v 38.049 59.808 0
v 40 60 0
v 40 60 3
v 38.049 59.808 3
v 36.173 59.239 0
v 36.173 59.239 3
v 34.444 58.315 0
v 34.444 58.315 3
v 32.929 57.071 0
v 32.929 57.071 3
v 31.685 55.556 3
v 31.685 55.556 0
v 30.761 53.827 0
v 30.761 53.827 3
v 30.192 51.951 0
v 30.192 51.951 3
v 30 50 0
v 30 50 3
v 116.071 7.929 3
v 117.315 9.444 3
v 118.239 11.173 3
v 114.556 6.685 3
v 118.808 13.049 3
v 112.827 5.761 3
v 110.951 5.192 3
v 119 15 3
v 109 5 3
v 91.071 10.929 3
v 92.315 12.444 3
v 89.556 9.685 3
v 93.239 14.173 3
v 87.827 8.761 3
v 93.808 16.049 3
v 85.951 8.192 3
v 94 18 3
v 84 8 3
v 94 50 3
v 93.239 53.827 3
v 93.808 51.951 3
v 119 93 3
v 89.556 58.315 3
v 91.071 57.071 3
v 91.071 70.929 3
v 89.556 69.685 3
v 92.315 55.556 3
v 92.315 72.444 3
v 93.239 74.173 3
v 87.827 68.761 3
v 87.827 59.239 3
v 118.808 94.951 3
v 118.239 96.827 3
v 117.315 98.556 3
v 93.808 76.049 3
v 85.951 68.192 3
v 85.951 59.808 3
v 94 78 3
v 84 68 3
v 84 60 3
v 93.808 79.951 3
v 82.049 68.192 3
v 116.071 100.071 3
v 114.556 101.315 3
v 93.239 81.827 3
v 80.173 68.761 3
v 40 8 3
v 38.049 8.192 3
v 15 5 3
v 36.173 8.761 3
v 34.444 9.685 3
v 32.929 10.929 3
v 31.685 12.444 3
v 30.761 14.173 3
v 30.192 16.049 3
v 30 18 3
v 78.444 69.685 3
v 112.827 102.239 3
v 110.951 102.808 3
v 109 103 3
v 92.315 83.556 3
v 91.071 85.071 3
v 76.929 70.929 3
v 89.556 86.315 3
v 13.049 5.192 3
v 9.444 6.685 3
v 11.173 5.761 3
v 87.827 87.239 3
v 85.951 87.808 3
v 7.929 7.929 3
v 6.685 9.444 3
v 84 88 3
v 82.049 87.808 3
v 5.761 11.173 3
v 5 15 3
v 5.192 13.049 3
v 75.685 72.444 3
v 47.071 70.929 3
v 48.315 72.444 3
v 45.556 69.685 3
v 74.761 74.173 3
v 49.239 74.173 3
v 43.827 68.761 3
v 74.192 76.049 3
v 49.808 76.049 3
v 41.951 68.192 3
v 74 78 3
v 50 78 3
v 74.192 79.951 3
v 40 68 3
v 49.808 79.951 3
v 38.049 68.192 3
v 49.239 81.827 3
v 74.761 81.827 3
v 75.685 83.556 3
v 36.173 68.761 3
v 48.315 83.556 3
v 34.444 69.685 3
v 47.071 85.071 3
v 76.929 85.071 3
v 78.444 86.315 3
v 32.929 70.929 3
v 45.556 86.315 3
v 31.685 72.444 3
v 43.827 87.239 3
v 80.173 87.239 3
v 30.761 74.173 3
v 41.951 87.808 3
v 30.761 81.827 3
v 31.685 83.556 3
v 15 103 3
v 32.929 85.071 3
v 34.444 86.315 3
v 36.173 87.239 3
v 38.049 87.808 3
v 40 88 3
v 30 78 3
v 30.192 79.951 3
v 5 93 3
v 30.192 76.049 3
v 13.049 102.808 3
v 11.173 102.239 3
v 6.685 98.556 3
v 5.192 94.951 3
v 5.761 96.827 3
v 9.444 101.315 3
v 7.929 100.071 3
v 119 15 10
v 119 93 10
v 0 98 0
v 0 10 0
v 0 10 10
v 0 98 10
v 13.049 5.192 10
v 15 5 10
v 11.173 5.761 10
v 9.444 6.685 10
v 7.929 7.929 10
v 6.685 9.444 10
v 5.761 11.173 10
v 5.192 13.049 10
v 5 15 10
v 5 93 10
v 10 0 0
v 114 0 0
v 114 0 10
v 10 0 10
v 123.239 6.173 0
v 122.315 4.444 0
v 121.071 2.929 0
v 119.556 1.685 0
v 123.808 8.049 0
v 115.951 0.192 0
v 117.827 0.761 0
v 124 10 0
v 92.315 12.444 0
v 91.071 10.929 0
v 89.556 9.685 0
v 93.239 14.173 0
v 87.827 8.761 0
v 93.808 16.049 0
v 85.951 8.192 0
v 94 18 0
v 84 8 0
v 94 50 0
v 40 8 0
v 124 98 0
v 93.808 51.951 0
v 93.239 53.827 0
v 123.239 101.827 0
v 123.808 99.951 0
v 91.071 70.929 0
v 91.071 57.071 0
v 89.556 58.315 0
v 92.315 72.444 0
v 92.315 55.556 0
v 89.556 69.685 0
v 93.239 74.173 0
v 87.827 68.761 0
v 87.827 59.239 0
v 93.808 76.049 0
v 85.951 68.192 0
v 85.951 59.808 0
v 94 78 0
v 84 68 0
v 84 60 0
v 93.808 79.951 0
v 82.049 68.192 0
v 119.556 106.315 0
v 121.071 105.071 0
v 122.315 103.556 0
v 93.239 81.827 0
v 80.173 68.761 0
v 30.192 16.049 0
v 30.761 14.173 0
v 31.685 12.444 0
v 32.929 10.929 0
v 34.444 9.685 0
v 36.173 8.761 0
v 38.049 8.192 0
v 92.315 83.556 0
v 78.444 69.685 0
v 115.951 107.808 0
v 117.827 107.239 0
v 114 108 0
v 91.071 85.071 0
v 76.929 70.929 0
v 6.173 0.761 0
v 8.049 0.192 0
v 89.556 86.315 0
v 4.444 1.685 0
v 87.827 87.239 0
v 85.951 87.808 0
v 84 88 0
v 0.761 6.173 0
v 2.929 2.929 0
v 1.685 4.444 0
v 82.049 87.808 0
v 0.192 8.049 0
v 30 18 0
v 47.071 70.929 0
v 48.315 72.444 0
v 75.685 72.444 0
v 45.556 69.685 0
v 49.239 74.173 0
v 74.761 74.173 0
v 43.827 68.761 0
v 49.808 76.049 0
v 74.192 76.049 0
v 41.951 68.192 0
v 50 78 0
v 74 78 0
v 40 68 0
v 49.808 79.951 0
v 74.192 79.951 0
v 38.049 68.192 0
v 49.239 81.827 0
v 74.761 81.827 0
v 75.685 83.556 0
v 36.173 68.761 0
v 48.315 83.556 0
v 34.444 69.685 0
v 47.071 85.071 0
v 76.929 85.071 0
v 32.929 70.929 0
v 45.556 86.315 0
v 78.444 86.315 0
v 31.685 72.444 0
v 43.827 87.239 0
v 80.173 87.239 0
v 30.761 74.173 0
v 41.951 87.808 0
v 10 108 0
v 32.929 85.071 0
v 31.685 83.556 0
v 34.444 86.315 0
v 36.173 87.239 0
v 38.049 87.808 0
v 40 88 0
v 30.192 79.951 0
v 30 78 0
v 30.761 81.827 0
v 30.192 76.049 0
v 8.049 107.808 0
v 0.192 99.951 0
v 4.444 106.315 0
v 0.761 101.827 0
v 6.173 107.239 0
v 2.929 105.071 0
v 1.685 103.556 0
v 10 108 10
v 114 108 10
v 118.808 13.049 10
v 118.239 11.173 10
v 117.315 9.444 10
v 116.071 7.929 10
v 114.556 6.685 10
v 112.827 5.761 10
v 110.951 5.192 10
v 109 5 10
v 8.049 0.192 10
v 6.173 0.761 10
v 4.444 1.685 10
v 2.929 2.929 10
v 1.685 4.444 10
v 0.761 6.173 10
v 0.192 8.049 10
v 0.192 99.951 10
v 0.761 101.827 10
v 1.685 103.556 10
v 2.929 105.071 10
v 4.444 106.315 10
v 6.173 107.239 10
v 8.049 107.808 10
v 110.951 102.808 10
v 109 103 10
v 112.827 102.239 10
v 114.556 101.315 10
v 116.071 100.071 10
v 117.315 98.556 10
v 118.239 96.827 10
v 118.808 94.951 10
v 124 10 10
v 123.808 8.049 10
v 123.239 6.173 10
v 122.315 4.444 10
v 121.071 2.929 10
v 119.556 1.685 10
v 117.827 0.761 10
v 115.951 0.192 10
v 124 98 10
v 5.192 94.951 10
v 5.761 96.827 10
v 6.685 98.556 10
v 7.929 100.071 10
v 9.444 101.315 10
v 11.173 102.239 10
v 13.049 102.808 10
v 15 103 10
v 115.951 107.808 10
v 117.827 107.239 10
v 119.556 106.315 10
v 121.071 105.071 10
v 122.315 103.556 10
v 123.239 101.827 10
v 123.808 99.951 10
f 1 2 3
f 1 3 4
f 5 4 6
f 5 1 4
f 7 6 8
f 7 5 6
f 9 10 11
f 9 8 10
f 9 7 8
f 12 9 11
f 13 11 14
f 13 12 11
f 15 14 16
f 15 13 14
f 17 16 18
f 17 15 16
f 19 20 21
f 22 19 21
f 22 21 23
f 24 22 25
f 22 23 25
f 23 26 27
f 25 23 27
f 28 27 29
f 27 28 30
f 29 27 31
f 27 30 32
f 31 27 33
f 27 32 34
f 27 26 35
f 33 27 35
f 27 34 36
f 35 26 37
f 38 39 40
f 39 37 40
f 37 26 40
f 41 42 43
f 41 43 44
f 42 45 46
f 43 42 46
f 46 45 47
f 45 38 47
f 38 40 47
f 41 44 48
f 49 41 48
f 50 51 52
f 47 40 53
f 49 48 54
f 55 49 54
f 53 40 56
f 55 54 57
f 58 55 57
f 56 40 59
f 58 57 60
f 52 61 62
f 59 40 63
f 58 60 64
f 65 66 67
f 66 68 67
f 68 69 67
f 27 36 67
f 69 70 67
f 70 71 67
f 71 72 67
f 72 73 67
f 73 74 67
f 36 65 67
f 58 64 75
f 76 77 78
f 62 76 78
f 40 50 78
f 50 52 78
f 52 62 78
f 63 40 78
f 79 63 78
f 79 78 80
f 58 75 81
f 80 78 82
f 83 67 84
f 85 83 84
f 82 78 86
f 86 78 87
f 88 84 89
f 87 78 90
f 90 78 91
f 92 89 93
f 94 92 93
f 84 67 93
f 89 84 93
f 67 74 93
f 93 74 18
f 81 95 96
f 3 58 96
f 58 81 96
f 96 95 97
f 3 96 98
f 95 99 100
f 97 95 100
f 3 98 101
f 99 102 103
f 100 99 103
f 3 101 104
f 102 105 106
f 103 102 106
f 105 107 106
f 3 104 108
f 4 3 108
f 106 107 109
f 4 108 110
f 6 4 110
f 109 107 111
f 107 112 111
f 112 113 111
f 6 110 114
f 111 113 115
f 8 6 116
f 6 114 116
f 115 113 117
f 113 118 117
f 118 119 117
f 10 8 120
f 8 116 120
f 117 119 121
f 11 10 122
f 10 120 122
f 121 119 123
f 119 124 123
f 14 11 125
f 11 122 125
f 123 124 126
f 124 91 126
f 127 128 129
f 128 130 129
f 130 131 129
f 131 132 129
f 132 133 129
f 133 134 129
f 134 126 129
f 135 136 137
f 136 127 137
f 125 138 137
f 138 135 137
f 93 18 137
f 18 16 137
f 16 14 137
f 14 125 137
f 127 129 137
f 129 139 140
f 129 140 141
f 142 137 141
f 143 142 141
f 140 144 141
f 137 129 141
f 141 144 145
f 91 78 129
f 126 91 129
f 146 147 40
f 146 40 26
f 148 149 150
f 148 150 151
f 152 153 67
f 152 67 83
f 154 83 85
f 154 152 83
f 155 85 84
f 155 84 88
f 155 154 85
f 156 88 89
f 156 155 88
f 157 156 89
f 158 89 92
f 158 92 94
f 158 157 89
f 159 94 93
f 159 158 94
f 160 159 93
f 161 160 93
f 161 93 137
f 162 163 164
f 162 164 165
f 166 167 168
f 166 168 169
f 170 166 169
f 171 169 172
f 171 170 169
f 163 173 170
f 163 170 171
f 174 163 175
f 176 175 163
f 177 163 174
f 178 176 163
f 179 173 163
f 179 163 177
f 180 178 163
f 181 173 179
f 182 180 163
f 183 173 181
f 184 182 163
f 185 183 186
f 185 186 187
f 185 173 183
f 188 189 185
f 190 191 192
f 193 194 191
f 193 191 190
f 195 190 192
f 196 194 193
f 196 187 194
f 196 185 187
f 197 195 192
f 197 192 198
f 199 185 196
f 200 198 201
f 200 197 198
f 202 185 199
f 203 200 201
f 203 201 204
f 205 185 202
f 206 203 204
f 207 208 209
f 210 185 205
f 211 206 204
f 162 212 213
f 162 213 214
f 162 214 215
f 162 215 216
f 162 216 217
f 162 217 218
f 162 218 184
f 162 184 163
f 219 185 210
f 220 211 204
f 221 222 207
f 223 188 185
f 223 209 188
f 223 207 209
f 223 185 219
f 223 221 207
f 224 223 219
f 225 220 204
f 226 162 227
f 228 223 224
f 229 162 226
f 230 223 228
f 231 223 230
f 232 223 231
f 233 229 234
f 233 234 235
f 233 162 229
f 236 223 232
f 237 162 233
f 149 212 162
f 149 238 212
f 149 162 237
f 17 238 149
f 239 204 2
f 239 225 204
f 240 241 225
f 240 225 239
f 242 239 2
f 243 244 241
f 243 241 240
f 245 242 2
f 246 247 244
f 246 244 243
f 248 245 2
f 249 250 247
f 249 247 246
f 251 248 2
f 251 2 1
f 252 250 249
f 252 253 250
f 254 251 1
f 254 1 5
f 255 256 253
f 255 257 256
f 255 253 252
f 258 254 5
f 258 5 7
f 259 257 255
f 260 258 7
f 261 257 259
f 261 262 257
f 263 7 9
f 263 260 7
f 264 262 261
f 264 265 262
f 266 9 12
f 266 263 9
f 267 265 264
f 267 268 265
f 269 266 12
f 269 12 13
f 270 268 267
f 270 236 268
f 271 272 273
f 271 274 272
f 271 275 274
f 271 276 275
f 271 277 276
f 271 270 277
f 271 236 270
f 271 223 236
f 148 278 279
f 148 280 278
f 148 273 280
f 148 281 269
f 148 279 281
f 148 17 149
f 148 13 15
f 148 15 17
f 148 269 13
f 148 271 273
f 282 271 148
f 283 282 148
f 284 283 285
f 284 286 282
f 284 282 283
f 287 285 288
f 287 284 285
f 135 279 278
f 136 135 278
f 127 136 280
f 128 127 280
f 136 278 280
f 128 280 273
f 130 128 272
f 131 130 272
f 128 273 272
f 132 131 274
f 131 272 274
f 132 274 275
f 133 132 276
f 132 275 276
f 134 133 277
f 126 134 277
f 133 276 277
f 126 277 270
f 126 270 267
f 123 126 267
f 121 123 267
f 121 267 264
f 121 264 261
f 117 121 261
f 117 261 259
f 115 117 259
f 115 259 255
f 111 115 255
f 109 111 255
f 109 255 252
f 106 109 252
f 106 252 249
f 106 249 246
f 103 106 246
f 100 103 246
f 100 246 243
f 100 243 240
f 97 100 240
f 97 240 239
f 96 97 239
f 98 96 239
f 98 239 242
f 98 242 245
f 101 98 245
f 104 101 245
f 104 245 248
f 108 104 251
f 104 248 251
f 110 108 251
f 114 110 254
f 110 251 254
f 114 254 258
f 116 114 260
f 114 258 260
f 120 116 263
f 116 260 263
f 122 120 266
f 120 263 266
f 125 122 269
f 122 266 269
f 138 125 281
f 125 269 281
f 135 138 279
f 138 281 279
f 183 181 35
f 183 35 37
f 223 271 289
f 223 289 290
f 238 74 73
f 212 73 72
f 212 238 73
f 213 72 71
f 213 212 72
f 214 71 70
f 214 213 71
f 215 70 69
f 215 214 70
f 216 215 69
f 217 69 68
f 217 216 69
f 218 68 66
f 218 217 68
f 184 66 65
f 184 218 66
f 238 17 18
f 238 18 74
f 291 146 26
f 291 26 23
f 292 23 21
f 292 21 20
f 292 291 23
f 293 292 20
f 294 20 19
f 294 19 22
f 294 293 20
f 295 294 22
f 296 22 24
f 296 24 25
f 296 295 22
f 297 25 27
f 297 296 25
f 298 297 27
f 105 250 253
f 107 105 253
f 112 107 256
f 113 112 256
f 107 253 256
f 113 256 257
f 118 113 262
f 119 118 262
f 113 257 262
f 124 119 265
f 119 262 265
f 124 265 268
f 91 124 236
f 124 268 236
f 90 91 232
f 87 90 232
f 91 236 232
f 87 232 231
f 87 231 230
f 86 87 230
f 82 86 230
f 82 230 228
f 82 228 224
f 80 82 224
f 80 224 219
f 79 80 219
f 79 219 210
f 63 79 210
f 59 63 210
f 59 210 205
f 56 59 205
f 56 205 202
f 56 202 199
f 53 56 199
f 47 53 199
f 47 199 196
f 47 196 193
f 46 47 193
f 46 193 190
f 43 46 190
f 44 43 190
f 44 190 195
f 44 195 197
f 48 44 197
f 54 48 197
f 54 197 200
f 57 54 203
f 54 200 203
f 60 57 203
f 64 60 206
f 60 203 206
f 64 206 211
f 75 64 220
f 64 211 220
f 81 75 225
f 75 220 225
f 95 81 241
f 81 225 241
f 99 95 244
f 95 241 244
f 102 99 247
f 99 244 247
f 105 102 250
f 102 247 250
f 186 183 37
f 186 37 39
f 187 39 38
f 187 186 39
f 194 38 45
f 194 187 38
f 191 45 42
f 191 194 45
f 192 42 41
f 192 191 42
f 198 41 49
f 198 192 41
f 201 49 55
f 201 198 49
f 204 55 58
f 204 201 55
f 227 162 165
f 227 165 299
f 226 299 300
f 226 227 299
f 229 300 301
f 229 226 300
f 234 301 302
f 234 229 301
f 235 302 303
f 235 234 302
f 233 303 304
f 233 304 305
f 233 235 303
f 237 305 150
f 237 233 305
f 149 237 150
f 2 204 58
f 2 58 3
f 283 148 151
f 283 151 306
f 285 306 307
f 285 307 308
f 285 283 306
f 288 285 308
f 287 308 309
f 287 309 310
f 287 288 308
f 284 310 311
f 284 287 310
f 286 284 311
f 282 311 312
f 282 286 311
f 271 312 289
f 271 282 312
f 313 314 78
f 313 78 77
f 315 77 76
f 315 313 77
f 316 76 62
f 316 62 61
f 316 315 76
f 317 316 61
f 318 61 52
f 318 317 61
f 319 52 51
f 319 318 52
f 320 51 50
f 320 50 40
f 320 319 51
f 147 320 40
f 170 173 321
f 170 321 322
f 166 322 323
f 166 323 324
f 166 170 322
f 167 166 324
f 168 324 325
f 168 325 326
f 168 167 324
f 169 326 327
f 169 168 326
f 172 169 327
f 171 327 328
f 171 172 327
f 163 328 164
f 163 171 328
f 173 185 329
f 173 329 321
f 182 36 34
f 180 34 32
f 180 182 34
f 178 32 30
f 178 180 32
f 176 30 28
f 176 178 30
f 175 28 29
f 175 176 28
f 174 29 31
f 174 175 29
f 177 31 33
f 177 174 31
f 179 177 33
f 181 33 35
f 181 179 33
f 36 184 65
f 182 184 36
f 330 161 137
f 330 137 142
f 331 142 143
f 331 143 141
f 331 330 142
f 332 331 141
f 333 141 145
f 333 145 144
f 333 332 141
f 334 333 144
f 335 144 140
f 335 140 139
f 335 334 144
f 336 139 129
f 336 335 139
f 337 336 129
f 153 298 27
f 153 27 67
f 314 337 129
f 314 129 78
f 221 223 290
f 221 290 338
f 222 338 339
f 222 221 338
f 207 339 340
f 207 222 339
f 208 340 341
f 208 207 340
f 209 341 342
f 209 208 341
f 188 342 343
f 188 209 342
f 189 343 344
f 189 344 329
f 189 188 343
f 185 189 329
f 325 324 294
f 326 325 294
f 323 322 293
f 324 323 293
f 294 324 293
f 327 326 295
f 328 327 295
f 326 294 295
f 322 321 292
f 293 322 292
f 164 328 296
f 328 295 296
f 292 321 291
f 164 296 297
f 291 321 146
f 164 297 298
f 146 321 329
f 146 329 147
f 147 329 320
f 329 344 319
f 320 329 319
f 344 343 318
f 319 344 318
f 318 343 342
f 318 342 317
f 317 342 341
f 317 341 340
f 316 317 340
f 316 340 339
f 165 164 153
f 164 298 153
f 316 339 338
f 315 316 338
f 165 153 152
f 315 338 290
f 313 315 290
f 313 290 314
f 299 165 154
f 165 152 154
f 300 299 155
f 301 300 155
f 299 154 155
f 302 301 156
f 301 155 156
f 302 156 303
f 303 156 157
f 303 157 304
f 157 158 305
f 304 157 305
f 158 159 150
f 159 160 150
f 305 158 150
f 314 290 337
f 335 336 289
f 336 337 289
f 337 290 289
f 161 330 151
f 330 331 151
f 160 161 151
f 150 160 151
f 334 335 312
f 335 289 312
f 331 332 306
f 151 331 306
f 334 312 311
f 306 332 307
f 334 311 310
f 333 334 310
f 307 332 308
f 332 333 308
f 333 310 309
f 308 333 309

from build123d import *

# Parameters (mm, degrees)
EXTRUDE_1_DEPTH     = 10
CUT_EXTRUDE_1_DEPTH = 7
CUT_EXTRUDE_2_DEPTH = 7
SKETCH_4_R          = 10
CUT_EXTRUDE_3_DEPTH = 7


with BuildPart() as part:
    # 草图1 → 凸台-拉伸1 (new body)
    with BuildSketch(Plane.XY):
        with BuildLine():
            Line((10, 108), (114, 108))
            ThreePointArc((114, 108), (121.071067812, 105.071067812), (124, 98))
            Line((124, 98), (124, 10))
            ThreePointArc((124, 10), (121.071067812, 2.928932188), (114, 0))
            Line((114, 0), (10, 0))
            ThreePointArc((10, 0), (2.928932188, 2.928932188), (0, 10))
            Line((0, 10), (0, 98))
            ThreePointArc((0, 98), (2.928932188, 105.071067812), (10, 108))
        make_face()
    extrude(amount=EXTRUDE_1_DEPTH)

    # 草图2 → 切除-拉伸1 (cut)
    with BuildSketch(Plane.XY.offset(10)):
        with BuildLine():
            Line((15, 103), (109, 103))
            ThreePointArc((109, 103), (116.071067812, 100.071067812), (119, 93))
            Line((119, 93), (119, 15))
            ThreePointArc((119, 15), (116.071067812, 7.928932188), (109, 5))
            Line((109, 5), (15, 5))
            ThreePointArc((15, 5), (7.928932188, 7.928932188), (5, 15))
            Line((5, 15), (5, 93))
            ThreePointArc((5, 93), (7.928932188, 100.071067812), (15, 103))
        make_face()
    extrude(amount=-CUT_EXTRUDE_1_DEPTH, mode=Mode.SUBTRACT)

    # 草图3 → 切除-拉伸2 (cut)
    with BuildSketch(Plane(origin=(0, 0, 0), x_dir=(-1, 0, 0), z_dir=(0, 0, -1))):
        with BuildLine():
            Line((-84, 60), (-40, 60))
            ThreePointArc((-40, 60), (-32.928932188, 57.071067812), (-30, 50))
            Line((-30, 50), (-30, 18))
            ThreePointArc((-30, 18), (-32.928932188, 10.928932188), (-40, 8))
            Line((-40, 8), (-84, 8))
            ThreePointArc((-84, 8), (-91.071067812, 10.928932188), (-94, 18))
            Line((-94, 18), (-94, 50))
            ThreePointArc((-94, 50), (-91.071067812, 57.071067812), (-84, 60))
        make_face()
    extrude(amount=-CUT_EXTRUDE_2_DEPTH, mode=Mode.SUBTRACT)

    # 草图4 → 切除-拉伸3 (cut)
    with BuildSketch(Plane(origin=(0, 0, 0), x_dir=(-1, 0, 0), z_dir=(0, 0, -1))):
        with Locations((-84, 78)):
            Circle(SKETCH_4_R)
        with Locations((-40, 78)):
            Circle(SKETCH_4_R)
    extrude(amount=-CUT_EXTRUDE_3_DEPTH, mode=Mode.SUBTRACT)


solid = part.part
